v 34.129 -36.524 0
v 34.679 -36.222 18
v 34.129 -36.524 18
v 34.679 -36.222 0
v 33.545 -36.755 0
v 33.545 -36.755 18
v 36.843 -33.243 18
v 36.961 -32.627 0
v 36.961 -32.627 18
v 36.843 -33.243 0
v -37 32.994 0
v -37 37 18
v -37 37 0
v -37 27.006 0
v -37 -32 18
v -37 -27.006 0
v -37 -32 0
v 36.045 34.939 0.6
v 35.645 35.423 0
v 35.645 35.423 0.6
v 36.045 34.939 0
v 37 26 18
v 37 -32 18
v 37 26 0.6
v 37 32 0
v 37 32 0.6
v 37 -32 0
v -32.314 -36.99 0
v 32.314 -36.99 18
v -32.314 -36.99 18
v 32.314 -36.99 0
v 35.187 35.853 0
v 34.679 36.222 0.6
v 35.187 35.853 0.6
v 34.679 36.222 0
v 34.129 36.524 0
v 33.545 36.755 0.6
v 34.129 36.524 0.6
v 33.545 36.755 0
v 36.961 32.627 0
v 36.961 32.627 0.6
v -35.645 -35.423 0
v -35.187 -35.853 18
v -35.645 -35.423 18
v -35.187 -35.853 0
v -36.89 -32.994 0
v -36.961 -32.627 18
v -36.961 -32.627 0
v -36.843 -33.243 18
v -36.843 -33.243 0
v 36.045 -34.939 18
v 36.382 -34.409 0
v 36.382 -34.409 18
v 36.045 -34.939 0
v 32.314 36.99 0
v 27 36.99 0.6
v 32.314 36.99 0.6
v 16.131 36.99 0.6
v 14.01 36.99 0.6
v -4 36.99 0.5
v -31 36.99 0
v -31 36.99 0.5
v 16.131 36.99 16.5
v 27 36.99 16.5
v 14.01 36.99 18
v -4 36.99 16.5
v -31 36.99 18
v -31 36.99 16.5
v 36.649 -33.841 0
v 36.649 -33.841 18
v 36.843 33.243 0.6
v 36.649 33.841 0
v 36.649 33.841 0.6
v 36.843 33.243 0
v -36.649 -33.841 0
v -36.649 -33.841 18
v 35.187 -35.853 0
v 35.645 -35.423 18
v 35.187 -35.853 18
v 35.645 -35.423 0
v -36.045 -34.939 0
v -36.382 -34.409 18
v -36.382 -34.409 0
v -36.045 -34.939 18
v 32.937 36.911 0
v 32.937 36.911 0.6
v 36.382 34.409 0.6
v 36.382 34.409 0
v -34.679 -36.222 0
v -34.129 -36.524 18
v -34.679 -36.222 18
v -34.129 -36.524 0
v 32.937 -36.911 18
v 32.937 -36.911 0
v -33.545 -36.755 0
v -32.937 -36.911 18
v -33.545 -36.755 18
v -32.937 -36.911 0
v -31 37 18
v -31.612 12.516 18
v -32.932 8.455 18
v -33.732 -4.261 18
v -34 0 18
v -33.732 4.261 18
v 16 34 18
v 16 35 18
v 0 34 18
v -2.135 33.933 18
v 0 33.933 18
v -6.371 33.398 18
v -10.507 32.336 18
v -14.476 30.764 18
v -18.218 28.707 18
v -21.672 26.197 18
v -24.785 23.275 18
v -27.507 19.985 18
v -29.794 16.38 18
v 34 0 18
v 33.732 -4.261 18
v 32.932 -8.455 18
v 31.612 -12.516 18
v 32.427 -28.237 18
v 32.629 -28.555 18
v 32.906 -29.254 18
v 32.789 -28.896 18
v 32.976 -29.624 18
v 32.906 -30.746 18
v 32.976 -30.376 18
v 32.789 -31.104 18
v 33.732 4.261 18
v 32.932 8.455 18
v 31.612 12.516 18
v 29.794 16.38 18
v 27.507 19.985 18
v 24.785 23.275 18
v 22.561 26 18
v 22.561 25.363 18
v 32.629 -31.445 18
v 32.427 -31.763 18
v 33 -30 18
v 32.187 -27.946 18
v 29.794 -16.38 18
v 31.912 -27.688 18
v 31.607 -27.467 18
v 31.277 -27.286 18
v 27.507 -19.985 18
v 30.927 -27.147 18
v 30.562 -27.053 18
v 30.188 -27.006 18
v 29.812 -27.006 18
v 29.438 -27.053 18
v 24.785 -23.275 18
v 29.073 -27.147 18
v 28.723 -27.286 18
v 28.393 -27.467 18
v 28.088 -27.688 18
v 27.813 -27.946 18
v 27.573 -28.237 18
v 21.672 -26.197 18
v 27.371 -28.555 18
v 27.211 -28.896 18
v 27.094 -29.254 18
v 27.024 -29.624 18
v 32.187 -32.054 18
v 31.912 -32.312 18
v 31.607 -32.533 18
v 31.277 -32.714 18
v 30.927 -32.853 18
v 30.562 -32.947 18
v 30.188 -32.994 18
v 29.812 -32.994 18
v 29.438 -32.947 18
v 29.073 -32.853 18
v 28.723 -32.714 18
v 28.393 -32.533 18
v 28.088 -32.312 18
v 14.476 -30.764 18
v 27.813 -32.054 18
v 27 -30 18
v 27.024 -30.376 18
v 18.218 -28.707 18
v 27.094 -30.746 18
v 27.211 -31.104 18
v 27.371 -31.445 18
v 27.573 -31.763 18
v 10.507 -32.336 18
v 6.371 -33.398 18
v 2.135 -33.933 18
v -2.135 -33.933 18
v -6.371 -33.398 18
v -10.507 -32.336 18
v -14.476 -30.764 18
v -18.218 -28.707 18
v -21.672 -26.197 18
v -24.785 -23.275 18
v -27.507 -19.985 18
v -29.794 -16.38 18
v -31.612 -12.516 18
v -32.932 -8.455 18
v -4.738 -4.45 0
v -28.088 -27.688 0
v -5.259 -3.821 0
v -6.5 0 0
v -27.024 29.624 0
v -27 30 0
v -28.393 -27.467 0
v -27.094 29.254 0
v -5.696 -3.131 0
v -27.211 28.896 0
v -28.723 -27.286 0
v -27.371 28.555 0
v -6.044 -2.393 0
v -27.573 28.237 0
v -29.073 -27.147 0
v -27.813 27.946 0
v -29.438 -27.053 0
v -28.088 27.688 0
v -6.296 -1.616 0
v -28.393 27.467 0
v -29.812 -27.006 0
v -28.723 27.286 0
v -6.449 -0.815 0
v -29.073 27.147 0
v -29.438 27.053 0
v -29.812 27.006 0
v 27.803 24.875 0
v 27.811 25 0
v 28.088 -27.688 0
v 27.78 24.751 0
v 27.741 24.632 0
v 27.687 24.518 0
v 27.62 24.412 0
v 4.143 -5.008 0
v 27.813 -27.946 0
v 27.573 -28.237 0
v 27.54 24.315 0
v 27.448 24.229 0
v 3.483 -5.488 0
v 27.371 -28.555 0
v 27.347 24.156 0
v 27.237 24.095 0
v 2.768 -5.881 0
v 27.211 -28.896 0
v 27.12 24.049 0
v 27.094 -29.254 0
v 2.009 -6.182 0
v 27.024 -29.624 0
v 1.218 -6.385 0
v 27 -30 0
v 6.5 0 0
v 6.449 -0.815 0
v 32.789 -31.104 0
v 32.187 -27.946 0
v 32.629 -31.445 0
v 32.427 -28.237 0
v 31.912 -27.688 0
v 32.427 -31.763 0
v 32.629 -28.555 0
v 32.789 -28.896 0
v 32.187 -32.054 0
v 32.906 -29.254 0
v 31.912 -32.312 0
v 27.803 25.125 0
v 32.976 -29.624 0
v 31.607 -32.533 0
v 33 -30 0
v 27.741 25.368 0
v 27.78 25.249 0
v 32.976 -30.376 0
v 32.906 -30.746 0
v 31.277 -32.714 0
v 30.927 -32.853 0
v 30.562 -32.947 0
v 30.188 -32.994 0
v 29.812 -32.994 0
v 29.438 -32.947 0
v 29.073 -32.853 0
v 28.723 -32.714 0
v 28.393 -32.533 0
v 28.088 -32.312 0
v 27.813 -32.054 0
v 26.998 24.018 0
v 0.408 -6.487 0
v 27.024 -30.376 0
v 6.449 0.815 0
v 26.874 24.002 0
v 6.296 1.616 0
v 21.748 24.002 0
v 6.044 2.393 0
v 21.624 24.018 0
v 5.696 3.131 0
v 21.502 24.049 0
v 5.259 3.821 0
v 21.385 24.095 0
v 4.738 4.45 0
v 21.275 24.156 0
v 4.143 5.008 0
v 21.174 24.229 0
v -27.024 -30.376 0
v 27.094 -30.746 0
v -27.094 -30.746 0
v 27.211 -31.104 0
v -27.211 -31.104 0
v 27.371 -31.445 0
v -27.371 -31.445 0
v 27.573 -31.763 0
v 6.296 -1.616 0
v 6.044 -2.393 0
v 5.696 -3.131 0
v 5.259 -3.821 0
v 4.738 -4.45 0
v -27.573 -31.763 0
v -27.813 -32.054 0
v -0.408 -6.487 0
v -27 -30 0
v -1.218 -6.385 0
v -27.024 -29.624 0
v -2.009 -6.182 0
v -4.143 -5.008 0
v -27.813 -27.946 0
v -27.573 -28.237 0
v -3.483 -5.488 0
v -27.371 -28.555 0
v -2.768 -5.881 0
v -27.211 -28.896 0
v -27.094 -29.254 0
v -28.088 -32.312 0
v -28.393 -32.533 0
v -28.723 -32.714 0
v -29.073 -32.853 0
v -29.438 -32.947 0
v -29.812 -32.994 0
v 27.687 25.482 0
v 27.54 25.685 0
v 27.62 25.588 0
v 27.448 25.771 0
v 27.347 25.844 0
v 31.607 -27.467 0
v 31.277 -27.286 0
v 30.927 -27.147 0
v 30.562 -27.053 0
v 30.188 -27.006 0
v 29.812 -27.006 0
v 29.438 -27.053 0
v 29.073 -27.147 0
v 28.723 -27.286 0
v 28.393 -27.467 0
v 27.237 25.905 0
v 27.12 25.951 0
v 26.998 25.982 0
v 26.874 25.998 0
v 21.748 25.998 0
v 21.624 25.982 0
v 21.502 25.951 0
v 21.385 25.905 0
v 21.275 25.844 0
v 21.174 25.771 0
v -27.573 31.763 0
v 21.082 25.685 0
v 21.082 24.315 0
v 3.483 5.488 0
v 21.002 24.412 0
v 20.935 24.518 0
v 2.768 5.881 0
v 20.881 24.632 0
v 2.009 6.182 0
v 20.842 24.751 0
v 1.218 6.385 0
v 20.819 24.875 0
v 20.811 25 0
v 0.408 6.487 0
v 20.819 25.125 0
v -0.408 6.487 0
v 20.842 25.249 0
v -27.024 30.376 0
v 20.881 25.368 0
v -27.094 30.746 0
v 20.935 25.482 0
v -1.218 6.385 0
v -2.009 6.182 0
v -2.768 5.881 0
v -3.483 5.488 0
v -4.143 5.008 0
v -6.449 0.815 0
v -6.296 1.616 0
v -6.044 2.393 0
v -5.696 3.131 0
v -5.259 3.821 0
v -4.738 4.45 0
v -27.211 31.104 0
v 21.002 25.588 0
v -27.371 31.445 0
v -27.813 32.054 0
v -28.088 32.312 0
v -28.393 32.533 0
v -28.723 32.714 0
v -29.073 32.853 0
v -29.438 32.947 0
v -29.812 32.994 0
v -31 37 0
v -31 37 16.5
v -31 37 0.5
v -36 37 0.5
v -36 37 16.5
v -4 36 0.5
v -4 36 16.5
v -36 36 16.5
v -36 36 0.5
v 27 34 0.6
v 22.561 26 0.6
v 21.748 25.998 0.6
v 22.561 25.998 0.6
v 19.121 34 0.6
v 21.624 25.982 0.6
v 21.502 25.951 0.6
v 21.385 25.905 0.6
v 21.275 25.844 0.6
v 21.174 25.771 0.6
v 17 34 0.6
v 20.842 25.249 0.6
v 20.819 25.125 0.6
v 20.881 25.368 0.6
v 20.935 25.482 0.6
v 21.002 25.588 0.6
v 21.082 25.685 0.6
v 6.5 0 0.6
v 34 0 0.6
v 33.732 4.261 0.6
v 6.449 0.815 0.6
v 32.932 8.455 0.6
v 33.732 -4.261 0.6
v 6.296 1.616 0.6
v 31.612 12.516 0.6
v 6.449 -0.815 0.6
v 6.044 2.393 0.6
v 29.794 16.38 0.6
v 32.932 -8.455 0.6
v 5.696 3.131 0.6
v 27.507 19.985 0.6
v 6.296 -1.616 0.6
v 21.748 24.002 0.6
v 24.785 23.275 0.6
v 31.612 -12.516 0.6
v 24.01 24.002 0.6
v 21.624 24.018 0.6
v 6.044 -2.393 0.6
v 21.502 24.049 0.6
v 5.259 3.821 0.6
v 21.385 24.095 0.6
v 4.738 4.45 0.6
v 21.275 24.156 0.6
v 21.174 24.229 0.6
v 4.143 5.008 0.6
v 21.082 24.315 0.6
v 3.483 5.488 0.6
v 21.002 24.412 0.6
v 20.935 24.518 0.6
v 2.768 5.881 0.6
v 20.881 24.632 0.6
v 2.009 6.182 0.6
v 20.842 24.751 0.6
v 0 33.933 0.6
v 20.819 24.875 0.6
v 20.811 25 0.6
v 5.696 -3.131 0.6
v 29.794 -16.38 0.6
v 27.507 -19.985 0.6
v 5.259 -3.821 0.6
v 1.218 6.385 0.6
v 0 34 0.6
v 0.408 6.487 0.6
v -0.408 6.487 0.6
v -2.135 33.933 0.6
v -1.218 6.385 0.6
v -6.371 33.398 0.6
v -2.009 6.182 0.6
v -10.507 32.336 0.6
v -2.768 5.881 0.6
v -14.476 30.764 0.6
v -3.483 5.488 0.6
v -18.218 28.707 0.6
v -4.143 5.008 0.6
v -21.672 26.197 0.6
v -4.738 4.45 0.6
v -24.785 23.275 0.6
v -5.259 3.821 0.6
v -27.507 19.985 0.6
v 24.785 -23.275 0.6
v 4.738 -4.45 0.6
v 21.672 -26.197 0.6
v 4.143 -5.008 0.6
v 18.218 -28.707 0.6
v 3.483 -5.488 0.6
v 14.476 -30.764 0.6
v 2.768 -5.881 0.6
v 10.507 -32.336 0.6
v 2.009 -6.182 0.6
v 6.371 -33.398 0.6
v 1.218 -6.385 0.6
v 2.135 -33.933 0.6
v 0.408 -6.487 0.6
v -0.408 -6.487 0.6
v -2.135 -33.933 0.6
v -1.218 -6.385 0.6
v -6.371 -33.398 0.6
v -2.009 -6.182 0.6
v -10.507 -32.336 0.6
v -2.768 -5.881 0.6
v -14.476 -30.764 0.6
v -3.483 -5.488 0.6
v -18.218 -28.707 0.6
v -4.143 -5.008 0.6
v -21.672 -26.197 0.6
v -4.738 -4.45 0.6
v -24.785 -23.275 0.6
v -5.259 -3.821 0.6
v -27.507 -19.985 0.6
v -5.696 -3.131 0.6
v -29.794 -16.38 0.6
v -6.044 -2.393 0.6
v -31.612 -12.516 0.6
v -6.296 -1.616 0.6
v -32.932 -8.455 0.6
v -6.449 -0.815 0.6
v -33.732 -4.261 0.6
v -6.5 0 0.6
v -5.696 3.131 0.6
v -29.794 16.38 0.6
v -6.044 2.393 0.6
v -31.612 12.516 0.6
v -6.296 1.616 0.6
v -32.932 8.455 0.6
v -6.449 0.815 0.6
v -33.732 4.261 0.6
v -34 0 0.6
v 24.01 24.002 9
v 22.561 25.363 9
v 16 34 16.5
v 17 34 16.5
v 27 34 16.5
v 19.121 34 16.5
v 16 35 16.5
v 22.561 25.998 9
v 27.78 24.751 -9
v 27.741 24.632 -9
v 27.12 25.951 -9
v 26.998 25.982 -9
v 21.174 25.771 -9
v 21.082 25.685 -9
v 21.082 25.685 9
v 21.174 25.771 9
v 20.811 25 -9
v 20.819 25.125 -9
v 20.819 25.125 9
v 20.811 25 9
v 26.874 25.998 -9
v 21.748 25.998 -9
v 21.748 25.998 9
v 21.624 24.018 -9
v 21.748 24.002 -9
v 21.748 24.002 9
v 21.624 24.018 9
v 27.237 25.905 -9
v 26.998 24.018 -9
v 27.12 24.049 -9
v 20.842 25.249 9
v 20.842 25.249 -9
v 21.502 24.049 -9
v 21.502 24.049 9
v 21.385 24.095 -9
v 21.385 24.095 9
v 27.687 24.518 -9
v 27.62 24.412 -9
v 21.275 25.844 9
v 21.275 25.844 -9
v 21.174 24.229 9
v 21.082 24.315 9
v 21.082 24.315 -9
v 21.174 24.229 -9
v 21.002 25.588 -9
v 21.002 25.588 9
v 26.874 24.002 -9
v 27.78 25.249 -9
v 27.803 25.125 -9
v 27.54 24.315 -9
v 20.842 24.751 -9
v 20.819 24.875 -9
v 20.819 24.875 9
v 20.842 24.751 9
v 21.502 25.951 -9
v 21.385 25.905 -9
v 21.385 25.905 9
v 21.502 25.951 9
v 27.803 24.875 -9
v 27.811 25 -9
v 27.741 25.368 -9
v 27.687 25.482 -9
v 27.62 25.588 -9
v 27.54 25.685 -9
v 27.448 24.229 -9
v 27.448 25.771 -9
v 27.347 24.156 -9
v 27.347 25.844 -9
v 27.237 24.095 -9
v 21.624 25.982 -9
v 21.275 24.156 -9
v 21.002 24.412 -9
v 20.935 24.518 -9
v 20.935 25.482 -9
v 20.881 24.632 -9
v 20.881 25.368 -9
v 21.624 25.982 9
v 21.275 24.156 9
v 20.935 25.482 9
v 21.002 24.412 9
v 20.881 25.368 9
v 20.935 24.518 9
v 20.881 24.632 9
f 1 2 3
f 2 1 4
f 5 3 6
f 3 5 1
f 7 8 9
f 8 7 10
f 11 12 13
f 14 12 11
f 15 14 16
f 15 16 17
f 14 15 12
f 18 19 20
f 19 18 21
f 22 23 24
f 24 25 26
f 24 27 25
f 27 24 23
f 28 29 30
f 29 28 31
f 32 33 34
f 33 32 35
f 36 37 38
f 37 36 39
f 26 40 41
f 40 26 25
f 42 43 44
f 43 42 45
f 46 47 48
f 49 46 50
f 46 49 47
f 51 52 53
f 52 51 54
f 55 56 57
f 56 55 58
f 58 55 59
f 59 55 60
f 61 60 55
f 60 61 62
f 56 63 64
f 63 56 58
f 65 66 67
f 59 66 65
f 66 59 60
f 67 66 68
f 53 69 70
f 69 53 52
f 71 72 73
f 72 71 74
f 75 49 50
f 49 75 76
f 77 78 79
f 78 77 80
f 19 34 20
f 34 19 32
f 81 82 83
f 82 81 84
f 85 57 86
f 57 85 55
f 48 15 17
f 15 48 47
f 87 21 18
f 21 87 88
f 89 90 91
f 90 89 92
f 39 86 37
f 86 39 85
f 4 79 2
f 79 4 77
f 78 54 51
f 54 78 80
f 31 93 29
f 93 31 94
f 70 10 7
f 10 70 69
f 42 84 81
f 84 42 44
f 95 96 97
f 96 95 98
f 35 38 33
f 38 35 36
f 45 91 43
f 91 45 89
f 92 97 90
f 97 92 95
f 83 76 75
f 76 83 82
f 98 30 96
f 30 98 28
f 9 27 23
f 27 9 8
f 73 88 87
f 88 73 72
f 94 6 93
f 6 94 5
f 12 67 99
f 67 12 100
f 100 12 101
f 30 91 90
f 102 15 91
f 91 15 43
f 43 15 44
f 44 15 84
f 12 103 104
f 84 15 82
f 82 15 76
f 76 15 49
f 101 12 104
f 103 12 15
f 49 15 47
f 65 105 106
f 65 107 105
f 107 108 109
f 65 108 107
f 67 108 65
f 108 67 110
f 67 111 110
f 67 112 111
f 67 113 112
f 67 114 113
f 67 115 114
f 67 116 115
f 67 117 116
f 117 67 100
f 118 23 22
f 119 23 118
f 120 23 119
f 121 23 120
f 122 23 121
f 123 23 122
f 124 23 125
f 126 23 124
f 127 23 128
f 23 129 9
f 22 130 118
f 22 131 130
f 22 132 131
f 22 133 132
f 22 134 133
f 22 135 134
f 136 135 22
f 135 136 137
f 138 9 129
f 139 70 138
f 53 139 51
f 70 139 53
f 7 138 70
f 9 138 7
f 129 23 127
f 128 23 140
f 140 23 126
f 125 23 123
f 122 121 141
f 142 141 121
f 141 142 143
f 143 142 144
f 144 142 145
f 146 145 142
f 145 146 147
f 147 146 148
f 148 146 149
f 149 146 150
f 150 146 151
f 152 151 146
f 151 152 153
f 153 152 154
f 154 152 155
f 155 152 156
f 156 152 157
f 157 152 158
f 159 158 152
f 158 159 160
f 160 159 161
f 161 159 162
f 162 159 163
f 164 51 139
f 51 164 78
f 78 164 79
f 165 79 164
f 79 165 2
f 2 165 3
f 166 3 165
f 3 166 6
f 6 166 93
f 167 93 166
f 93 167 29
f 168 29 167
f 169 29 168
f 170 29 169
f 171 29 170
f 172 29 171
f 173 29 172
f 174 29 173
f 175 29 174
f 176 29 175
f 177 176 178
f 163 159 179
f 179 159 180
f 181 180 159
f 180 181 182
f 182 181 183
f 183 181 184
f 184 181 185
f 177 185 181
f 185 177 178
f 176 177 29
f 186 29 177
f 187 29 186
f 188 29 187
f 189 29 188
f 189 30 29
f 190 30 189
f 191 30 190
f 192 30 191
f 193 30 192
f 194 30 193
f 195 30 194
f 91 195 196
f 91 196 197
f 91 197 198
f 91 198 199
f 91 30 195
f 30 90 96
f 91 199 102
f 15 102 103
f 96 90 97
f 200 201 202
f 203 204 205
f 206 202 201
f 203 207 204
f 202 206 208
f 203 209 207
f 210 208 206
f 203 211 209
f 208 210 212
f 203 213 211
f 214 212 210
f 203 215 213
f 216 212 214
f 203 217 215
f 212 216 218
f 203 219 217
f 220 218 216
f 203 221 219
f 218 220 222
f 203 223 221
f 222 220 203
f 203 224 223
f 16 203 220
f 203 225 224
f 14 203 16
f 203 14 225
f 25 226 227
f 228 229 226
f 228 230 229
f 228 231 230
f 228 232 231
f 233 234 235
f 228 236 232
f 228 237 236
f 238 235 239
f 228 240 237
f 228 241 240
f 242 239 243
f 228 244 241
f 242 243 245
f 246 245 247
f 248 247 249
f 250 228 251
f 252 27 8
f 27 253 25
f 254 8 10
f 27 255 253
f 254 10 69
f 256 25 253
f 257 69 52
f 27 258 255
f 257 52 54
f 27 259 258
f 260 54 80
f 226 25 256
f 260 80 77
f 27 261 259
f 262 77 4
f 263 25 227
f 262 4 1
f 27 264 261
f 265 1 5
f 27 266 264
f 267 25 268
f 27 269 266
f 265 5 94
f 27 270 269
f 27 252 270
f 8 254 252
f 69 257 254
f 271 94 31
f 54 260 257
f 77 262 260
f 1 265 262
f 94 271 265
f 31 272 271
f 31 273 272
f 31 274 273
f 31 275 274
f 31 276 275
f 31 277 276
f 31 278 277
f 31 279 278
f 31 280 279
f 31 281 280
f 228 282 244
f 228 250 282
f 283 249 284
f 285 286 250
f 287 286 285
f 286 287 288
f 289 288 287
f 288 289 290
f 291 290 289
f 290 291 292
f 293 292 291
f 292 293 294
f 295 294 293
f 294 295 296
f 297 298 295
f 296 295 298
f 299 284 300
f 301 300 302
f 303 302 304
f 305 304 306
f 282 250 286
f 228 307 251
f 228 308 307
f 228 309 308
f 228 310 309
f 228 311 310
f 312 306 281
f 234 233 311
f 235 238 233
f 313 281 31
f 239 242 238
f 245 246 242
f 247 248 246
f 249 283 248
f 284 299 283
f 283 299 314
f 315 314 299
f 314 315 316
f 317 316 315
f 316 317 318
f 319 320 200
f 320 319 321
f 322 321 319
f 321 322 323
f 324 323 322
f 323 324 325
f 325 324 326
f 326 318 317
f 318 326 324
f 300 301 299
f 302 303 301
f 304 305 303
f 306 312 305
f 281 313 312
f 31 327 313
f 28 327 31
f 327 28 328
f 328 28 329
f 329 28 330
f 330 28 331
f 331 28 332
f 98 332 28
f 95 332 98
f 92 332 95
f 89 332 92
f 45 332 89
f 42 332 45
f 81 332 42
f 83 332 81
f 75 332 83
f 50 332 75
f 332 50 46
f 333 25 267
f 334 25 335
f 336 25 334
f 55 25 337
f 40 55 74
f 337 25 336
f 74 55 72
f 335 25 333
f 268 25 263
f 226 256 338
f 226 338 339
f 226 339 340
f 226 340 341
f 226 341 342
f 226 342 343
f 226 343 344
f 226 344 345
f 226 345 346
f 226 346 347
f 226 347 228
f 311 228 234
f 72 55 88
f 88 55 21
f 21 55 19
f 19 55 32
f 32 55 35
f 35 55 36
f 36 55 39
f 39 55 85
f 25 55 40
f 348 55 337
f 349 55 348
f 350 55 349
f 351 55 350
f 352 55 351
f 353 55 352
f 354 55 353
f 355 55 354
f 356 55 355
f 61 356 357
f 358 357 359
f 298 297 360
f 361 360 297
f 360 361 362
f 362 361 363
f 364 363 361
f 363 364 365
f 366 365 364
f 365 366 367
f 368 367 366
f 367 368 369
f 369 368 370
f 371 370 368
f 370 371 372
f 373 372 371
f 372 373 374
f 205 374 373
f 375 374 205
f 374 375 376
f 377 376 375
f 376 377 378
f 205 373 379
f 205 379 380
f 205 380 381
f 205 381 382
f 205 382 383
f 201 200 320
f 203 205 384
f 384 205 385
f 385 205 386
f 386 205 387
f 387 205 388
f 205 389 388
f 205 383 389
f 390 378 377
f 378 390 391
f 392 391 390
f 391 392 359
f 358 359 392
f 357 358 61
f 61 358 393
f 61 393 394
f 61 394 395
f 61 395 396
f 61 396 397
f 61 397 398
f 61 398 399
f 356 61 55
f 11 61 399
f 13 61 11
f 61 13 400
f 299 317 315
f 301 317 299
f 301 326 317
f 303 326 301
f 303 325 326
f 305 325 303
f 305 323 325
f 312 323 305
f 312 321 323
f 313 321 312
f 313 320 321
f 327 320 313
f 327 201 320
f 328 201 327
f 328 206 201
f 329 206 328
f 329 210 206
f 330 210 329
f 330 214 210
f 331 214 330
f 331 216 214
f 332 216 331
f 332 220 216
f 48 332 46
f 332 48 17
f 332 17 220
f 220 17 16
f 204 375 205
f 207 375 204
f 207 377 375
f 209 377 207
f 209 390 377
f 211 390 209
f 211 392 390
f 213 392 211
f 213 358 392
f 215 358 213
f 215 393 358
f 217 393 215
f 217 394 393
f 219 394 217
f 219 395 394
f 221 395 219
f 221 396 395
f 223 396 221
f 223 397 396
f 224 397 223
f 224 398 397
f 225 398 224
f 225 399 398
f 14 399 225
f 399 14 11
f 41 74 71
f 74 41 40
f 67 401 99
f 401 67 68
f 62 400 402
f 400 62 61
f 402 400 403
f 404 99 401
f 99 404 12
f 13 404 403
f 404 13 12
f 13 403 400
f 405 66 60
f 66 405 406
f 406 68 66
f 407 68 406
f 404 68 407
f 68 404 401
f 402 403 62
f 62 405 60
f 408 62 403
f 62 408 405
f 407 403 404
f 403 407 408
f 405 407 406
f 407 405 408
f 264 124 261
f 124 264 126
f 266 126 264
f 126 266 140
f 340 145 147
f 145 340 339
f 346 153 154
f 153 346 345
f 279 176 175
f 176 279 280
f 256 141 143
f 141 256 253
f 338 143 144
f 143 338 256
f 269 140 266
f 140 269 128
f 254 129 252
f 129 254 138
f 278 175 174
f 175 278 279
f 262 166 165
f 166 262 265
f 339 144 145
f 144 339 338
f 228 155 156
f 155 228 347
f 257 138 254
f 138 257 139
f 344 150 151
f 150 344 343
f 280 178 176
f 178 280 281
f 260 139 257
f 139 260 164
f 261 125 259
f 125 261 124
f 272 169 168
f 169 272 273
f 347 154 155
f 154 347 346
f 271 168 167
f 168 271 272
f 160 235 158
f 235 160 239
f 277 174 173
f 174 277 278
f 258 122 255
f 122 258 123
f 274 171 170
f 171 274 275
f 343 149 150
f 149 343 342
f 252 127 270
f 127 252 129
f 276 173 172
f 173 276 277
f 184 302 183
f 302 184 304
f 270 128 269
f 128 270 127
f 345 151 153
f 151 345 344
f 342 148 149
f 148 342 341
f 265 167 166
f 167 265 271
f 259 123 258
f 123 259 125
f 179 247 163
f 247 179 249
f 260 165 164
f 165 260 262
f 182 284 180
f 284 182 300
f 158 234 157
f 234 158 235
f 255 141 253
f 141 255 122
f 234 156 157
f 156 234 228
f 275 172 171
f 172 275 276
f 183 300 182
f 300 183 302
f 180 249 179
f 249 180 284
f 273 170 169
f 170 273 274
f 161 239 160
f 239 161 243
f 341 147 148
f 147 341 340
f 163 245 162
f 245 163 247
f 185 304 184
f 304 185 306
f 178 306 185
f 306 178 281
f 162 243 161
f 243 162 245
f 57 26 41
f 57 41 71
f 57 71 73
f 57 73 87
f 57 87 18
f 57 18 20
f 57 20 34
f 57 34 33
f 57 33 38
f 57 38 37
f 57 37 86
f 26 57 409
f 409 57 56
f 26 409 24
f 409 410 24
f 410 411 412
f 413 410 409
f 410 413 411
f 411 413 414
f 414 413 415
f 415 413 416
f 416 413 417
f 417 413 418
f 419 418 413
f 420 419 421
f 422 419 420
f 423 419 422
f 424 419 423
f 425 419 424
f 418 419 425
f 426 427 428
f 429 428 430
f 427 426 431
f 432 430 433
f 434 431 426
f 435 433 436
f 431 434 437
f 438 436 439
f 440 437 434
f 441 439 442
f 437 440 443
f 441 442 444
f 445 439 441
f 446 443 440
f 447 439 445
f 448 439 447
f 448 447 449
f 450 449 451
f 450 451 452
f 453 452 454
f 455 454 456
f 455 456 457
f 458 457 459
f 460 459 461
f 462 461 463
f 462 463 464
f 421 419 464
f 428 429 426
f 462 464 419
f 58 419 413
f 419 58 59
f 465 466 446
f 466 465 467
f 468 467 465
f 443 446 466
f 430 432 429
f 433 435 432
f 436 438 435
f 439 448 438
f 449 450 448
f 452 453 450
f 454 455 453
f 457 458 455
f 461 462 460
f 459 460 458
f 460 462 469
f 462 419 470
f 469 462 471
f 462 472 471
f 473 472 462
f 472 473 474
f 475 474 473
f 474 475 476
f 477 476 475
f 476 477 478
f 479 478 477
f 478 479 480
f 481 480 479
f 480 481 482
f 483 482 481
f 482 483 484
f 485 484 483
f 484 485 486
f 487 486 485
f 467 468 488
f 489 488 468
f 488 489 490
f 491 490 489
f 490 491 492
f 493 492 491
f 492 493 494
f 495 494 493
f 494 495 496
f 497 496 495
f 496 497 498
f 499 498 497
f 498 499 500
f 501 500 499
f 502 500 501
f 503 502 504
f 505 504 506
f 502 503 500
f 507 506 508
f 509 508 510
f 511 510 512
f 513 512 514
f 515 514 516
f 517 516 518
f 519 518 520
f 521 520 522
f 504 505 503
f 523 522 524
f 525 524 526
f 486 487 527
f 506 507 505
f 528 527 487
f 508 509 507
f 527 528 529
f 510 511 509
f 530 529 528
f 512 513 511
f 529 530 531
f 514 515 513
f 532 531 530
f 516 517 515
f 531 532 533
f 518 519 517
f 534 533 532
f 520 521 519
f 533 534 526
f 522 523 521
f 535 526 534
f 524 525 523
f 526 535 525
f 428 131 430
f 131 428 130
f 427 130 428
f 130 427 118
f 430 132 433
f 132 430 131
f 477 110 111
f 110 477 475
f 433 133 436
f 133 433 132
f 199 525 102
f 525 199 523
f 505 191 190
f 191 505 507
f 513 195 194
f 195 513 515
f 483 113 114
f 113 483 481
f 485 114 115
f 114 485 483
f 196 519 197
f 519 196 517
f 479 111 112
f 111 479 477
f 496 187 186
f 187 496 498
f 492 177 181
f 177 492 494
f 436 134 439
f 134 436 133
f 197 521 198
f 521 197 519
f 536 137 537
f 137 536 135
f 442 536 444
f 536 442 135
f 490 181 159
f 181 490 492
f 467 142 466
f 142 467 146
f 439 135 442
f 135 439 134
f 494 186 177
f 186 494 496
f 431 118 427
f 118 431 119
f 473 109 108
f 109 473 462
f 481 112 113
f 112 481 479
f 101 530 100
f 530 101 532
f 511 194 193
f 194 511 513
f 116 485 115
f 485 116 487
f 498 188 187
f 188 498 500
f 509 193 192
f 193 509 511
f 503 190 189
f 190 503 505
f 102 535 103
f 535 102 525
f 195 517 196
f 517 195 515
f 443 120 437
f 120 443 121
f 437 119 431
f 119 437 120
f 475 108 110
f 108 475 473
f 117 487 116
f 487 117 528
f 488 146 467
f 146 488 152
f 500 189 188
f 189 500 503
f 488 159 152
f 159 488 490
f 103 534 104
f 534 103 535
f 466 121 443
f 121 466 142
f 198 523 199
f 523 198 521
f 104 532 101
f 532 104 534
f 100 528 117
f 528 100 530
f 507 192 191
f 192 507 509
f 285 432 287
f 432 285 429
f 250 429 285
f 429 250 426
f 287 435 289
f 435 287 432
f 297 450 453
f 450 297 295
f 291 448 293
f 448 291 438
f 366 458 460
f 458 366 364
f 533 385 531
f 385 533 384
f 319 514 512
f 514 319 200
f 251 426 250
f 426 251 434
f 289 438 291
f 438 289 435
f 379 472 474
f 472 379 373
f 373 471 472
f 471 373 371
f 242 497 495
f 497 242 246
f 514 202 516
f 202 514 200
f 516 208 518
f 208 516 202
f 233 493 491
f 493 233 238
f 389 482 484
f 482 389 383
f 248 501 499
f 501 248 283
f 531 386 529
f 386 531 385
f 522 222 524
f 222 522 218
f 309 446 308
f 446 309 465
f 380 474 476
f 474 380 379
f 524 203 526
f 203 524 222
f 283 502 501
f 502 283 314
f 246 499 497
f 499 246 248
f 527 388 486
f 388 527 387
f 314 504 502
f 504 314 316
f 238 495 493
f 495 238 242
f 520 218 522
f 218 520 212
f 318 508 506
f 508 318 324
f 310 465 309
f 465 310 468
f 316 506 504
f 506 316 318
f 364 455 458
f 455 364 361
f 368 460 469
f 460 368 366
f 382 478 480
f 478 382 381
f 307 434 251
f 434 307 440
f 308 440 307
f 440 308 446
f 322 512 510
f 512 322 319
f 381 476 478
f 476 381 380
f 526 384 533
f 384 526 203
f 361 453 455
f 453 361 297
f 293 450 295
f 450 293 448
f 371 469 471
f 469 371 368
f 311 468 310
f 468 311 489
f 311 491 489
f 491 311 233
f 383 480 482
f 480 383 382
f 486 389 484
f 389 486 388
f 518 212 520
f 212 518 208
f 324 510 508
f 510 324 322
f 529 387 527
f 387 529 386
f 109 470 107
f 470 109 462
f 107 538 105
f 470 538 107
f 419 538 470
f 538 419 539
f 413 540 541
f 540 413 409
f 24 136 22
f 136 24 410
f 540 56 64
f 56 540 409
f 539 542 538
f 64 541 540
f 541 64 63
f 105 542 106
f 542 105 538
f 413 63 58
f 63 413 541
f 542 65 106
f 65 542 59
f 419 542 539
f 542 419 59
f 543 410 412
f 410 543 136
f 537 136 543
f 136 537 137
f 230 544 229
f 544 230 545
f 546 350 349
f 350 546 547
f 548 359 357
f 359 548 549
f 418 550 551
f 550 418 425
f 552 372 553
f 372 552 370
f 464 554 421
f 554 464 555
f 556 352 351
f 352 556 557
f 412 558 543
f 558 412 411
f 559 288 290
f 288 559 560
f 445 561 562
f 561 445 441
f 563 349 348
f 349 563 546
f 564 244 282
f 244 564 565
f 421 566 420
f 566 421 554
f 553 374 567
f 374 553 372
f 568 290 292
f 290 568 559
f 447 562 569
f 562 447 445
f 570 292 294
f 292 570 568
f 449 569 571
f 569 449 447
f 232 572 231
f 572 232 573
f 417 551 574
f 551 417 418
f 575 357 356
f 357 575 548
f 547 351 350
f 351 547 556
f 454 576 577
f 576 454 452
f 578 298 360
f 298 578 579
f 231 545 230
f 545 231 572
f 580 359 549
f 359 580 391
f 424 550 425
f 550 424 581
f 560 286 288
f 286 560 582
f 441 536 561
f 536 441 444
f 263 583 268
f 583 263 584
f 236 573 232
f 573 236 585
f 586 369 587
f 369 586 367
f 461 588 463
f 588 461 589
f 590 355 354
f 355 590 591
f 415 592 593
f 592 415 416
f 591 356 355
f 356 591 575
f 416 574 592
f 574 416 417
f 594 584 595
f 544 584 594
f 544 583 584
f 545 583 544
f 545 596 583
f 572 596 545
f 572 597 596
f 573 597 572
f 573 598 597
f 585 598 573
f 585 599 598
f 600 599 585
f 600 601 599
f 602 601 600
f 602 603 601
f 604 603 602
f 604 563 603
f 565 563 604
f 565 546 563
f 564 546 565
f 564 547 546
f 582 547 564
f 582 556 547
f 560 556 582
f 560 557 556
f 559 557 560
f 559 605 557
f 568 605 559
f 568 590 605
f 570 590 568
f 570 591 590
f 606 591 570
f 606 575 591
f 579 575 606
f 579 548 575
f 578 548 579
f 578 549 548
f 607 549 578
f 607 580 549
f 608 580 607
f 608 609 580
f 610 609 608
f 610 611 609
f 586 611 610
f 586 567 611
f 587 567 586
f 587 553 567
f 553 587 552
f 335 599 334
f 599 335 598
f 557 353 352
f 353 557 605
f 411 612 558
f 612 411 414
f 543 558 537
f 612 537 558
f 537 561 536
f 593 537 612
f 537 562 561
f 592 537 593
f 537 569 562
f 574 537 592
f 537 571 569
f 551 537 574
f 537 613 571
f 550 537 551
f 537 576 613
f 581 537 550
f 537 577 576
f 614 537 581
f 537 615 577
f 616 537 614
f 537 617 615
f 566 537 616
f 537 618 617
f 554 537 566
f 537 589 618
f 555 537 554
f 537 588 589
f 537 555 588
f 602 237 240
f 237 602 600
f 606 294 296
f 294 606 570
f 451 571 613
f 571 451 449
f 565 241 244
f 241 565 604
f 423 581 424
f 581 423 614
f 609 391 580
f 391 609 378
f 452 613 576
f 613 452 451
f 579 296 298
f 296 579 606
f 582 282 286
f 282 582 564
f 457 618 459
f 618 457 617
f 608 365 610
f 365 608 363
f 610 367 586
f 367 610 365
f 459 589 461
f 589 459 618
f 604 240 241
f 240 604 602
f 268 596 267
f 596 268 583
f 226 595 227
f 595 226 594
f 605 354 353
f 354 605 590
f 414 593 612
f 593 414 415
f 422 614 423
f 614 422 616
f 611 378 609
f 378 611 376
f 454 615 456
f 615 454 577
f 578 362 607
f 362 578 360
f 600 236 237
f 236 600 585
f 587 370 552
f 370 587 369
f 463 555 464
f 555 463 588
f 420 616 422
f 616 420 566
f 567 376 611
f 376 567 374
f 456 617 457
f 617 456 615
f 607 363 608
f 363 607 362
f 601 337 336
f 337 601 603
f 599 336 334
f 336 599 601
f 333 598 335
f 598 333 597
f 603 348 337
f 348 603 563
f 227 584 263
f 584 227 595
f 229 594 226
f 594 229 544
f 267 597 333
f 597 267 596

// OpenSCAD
$fn = 50;


union() {
	difference() {
		union() {
			hull() {
				translate(v = [-32.0000000000, 32.0000000000, 0]) {
					cylinder(h = 18, r = 5);
				}
				translate(v = [32.0000000000, 32.0000000000, 0]) {
					cylinder(h = 18, r = 5);
				}
				translate(v = [-32.0000000000, -32.0000000000, 0]) {
					cylinder(h = 18, r = 5);
				}
				translate(v = [32.0000000000, -32.0000000000, 0]) {
					cylinder(h = 18, r = 5);
				}
			}
			translate(v = [-37.0000000000, 31.0000000000, 0]) {
				cube(size = [6, 6, 18]);
			}
		}
		union() {
			translate(v = [-37.5000000000, -30.0000000000, -250.0000000000]) {
				rotate(a = [0, 0, 0]) {
					difference() {
						union() {
							hull() {
								translate(v = [7.5000000000, 0, 0]) {
									cylinder(h = 250, r = 3.0000000000, r1 = 3.0000000000, r2 = 3.0000000000);
								}
								translate(v = [-7.5000000000, 0, 0]) {
									cylinder(h = 250, r = 3.0000000000, r1 = 3.0000000000, r2 = 3.0000000000);
								}
							}
						}
						union();
					}
				}
			}
			translate(v = [-37.5000000000, 30.0000000000, -250.0000000000]) {
				rotate(a = [0, 0, 0]) {
					difference() {
						union() {
							hull() {
								translate(v = [7.5000000000, 0, 0]) {
									cylinder(h = 250, r = 3.0000000000, r1 = 3.0000000000, r2 = 3.0000000000);
								}
								translate(v = [-7.5000000000, 0, 0]) {
									cylinder(h = 250, r = 3.0000000000, r1 = 3.0000000000, r2 = 3.0000000000);
								}
							}
						}
						union();
					}
				}
			}
			translate(v = [-36.0000000000, 36.0000000000, 0.5000000000]) {
				cube(size = [32, 1, 16]);
			}
			translate(v = [30.0000000000, -30.0000000000, 0]) {
				cylinder(h = 100, r = 3.0000000000);
			}
			translate(v = [0, 0, 0.6000000000]) {
				cylinder(h = 20.4000000000, r = 34.0000000000);
			}
			translate(v = [0, 0, -9.0000000000]) {
				cylinder(h = 18, r = 6.5000000000);
			}
			translate(v = [0.0000000000, 26.0000000000, 0.6000000000]) {
				cube(size = [37.0000000000, 8, 20.4000000000]);
			}
			translate(v = [27.0000000000, 26.0000000000, 0.6000000000]) {
				cube(size = [10, 11, 20.4000000000]);
			}
			translate(v = [16.0000000000, 26.0000000000, 16.5000000000]) {
				cube(size = [21, 11, 1.5000000000]);
			}
			translate(v = [13.2500000000, 37.7500000000, 0.6000000000]) {
				rotate(a = [0, 0, -45]) {
					cube(size = [7.5000000000, 1.5000000000, 20.4000000000]);
				}
			}
			translate(v = [15.0610000000, 24.0000000000, 0.6000000000]) {
				cube(size = [7.5000000000, 2, 17.4000000000]);
			}
		}
	}
	union() {
		translate(v = [24.3110000000, 25.0000000000, -9.0000000000]) {
			rotate(a = [0, 0, 0]) {
				difference() {
					union() {
						#hull() {
							#translate(v = [2.5000000000, 0, 0]) {
								cylinder(h = 18, r = 1.0000000000, r1 = 1.0000000000, r2 = 1.0000000000);
							}
							#translate(v = [-2.5000000000, 0, 0]) {
								cylinder(h = 18, r = 1.0000000000, r1 = 1.0000000000, r2 = 1.0000000000);
							}
						}
					}
					union();
				}
			}
		}
	}
}
